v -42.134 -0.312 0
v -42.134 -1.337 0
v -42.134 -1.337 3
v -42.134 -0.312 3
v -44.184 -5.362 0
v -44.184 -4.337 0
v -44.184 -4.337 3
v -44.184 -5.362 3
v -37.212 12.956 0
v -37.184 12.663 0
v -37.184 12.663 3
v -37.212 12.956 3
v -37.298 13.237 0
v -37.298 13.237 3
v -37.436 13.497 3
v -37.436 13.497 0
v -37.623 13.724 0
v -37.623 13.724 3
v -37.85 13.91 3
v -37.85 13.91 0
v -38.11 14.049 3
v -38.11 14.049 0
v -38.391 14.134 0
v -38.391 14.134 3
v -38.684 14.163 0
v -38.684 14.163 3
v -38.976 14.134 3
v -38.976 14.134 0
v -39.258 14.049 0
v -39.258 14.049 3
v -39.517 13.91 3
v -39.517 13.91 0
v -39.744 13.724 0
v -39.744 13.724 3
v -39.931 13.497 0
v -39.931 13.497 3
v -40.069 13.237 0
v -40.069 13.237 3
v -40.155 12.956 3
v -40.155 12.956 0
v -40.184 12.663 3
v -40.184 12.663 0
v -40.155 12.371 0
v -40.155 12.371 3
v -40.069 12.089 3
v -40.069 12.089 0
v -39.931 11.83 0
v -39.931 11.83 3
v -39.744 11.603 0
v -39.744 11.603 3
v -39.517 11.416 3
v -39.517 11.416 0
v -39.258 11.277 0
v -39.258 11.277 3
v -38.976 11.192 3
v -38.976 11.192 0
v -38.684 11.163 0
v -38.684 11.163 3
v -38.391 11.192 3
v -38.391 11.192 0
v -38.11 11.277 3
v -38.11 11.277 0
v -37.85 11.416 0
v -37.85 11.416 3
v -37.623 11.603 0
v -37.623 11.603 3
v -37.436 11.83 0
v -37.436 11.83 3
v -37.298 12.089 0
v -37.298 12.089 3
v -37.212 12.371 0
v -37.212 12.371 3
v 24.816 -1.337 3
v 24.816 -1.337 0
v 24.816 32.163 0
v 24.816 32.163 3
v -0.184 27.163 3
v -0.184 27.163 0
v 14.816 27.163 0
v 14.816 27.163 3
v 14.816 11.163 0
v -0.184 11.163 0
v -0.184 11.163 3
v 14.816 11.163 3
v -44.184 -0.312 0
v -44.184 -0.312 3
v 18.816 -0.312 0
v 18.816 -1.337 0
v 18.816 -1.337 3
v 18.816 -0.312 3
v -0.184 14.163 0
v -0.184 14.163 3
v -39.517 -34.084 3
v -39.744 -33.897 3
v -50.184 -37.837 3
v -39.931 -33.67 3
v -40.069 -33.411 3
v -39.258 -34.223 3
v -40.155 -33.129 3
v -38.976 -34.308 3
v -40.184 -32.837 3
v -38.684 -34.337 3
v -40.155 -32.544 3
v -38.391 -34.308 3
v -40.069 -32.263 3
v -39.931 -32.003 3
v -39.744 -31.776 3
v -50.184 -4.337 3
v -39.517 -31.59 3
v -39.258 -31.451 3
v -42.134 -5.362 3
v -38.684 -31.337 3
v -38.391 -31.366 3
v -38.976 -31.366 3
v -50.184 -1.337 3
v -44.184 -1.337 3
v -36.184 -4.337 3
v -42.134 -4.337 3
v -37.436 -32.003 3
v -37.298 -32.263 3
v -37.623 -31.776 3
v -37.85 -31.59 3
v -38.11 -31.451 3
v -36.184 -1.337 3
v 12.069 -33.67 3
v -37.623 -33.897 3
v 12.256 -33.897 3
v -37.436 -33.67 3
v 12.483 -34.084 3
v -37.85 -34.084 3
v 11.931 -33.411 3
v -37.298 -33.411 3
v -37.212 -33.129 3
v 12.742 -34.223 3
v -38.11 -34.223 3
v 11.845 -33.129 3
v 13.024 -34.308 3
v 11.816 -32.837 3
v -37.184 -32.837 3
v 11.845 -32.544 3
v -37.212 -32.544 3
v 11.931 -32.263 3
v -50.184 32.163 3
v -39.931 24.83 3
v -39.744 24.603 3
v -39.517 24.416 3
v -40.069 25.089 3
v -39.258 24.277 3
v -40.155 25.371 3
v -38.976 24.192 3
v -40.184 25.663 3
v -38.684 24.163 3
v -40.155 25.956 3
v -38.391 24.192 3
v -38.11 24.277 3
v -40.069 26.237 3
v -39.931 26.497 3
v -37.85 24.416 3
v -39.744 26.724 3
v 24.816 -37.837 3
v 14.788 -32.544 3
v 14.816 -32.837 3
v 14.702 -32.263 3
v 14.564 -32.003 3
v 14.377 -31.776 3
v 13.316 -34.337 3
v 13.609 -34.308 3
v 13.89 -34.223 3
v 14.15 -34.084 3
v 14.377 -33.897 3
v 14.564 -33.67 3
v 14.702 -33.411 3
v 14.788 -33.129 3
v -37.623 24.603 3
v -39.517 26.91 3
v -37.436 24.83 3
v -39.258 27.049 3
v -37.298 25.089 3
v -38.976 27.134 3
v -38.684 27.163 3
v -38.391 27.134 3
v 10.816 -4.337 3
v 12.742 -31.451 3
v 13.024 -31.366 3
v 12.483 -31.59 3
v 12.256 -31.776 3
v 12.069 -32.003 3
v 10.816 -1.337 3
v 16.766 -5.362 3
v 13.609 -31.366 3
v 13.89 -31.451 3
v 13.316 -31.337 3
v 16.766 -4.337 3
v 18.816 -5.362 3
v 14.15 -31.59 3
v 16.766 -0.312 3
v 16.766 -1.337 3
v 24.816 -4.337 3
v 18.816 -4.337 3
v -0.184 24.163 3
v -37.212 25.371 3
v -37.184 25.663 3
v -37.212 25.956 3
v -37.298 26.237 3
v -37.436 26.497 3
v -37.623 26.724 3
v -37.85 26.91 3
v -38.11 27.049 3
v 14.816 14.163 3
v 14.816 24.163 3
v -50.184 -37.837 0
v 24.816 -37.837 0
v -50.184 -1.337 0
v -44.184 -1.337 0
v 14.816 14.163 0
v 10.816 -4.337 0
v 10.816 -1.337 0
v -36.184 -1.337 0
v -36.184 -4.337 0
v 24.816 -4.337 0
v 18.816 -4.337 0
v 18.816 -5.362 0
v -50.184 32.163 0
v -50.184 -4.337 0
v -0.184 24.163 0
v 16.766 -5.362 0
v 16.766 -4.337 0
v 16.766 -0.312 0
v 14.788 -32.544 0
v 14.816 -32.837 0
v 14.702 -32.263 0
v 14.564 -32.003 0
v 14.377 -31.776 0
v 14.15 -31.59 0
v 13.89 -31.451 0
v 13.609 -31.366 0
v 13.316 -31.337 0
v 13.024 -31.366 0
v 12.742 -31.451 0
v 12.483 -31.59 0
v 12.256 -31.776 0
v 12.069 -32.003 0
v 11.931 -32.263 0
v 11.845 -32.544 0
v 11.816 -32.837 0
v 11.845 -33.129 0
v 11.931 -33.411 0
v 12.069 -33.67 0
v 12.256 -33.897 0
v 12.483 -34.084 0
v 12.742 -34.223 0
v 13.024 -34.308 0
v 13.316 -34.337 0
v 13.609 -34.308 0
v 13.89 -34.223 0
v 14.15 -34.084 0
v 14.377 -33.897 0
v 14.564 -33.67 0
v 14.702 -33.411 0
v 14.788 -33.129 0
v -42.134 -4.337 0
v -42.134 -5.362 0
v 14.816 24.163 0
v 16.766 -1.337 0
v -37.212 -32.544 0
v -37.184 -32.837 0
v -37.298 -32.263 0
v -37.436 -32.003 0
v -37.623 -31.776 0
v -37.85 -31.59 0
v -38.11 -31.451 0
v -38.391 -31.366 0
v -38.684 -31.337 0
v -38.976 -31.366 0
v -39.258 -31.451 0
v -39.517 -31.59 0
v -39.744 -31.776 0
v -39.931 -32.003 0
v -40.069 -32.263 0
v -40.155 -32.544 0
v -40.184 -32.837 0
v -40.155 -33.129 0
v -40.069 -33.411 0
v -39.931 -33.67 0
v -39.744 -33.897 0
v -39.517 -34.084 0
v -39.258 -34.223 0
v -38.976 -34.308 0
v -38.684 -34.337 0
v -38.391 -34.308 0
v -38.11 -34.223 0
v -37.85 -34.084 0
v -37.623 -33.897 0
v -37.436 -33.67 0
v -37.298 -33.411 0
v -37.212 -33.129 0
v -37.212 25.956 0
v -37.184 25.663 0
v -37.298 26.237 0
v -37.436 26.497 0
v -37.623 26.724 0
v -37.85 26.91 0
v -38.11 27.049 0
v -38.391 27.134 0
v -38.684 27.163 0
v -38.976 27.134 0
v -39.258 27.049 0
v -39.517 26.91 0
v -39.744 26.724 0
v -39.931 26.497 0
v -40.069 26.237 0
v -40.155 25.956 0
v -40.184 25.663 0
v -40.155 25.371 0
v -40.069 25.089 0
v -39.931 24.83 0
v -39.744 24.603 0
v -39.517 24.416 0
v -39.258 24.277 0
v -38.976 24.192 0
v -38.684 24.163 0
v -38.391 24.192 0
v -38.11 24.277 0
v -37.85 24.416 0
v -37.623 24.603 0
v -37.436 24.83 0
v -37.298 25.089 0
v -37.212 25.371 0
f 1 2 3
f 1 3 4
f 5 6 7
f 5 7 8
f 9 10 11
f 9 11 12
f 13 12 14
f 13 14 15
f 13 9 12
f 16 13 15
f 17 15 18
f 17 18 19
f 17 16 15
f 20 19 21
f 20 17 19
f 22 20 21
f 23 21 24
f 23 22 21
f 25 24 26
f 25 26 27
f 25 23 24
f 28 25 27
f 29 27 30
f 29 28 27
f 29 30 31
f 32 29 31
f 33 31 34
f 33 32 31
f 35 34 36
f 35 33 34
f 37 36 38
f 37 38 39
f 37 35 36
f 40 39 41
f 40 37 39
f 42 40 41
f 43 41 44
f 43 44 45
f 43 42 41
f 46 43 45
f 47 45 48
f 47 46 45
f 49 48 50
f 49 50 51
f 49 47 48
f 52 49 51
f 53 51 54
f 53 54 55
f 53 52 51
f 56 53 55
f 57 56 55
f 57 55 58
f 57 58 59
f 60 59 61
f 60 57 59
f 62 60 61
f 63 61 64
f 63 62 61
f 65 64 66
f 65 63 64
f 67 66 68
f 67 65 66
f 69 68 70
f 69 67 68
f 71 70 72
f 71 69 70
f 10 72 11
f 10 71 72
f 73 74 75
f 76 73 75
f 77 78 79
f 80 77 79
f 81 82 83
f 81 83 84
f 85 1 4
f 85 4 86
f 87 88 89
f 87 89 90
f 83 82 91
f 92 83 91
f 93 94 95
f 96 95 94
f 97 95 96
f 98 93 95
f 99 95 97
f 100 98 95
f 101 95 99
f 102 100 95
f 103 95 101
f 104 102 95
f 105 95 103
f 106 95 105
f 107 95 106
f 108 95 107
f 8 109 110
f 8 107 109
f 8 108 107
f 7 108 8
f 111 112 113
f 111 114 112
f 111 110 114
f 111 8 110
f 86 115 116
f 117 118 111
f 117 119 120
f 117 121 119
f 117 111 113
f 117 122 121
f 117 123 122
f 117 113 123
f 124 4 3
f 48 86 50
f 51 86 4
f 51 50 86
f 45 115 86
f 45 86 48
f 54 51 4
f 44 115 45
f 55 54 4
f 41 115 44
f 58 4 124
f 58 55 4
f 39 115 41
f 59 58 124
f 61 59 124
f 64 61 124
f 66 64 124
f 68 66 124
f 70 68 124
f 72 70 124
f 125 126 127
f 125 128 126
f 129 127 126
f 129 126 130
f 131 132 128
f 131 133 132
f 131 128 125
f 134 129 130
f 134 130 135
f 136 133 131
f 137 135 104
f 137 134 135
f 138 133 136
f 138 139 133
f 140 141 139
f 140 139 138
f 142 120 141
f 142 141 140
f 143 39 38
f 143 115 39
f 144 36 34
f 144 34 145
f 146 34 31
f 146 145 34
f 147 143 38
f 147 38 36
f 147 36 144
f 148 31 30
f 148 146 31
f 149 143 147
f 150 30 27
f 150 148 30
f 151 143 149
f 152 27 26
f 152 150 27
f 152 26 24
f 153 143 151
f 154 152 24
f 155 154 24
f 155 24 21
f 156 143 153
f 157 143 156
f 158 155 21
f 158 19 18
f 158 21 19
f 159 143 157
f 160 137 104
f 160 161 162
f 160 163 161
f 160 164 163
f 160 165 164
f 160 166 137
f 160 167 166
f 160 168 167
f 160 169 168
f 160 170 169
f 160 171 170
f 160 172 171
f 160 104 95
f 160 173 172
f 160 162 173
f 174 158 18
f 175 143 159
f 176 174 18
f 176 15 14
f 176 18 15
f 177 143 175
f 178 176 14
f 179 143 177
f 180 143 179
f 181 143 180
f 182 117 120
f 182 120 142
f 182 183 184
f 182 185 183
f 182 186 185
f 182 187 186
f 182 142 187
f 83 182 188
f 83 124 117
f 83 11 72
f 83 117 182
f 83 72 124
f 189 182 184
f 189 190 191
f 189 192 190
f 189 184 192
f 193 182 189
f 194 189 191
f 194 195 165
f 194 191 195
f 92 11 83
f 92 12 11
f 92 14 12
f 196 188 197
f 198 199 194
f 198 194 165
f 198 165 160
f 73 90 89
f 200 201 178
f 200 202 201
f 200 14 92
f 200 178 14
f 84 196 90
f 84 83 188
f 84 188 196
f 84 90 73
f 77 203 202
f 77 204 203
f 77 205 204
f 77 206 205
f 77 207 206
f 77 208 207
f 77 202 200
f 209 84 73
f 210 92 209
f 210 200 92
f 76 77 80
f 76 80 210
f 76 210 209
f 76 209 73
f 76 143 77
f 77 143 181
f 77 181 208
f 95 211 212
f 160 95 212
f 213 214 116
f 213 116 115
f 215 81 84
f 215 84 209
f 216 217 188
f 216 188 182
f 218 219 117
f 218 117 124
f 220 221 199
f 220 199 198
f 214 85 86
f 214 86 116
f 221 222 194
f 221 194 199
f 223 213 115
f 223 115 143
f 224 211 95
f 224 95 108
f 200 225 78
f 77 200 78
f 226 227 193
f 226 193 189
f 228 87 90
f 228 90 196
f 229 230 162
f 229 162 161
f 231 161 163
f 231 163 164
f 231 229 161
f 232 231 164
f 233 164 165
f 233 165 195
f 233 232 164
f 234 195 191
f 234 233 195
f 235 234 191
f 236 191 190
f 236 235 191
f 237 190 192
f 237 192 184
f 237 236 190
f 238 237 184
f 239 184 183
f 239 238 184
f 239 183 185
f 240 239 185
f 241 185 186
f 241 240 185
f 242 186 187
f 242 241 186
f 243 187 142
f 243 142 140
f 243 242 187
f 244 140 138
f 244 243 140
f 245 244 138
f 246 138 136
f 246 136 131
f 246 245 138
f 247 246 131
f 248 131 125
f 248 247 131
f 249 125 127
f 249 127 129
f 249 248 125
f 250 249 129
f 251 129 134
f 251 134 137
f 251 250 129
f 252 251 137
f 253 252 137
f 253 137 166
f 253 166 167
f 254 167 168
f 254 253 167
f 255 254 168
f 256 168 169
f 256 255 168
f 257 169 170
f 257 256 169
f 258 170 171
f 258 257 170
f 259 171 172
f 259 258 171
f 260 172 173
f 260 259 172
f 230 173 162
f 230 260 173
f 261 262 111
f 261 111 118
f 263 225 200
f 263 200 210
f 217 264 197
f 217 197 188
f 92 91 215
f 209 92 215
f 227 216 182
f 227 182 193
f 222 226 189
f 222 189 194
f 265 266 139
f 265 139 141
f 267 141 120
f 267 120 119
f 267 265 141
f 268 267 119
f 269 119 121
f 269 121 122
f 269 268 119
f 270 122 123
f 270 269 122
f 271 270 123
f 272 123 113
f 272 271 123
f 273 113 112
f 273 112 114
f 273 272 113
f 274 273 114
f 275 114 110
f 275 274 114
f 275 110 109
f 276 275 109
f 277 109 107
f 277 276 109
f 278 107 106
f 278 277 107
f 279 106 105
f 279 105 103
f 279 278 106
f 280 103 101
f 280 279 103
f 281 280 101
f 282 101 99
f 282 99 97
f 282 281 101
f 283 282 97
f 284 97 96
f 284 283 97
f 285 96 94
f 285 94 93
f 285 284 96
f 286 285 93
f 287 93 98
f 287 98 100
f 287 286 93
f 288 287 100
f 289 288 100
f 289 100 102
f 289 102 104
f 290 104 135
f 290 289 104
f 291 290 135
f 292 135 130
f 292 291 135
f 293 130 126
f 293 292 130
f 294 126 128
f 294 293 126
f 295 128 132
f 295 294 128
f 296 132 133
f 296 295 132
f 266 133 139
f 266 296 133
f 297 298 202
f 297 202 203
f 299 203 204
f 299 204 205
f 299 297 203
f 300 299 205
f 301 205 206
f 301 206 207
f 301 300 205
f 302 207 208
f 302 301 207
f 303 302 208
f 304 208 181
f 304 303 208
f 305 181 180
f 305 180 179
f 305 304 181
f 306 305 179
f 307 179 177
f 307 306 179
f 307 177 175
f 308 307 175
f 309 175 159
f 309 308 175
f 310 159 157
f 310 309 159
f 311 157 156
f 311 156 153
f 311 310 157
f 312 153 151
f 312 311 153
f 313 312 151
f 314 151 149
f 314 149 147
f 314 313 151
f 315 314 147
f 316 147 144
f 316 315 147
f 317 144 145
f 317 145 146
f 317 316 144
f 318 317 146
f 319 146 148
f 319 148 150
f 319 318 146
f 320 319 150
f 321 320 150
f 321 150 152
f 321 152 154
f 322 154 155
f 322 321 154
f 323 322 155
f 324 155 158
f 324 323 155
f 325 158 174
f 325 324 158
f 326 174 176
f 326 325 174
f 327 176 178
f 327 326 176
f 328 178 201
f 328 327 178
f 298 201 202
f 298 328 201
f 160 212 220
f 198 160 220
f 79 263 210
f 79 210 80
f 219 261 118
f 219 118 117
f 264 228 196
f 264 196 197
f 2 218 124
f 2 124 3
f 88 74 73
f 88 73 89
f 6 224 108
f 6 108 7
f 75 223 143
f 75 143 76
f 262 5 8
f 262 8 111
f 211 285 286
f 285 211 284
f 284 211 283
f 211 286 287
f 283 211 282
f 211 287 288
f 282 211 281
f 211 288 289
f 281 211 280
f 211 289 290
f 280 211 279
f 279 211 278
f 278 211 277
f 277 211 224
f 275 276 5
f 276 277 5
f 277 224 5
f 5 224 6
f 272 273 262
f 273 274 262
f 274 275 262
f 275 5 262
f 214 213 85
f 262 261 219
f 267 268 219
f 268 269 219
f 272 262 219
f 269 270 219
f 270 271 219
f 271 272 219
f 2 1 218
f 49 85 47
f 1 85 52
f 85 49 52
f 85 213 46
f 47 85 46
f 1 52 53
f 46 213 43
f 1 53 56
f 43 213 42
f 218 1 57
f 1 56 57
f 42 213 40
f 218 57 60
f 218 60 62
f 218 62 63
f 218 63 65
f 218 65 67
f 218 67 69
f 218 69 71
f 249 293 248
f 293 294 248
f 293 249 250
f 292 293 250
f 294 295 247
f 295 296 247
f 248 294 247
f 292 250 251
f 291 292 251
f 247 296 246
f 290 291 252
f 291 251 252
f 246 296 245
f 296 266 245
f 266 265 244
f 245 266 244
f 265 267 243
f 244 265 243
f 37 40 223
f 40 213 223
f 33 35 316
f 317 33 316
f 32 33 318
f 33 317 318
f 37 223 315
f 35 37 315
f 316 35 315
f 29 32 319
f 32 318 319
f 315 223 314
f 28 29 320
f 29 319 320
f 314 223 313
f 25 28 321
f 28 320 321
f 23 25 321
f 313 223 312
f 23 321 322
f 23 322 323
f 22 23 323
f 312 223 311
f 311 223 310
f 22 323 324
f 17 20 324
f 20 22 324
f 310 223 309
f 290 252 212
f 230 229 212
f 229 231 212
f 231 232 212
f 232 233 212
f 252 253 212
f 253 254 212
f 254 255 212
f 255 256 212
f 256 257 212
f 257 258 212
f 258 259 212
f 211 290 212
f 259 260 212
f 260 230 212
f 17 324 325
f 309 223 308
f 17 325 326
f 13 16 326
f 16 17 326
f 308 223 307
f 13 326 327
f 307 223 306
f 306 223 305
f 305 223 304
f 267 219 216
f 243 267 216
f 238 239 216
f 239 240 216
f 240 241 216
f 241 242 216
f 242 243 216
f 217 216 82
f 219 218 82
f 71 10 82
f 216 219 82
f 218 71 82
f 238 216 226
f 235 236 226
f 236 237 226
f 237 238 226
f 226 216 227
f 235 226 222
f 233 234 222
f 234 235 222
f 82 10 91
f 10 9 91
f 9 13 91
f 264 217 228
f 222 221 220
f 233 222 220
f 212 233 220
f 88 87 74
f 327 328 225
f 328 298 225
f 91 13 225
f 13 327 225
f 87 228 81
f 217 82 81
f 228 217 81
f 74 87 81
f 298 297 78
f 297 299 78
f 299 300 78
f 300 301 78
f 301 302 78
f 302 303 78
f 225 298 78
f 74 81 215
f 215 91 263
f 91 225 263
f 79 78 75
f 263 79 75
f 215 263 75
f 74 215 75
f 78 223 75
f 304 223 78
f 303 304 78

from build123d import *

# Parameters (mm, degrees)
ESQUISSE1_W                  = 75
ESQUISSE1_H                  = 70
ESQUISSE1_R                  = 1.5
ESQUISSE1_W_2                = 15
ESQUISSE1_H_2                = 3
BOSS_EXTRU_1_DEPTH           = 3
ENL_V_MAT_EXTRU_1_DEPTH      = 10
ENL_V_MAT_EXTRU_1_DEPTH_BACK = 10


with BuildPart() as part:
    # Esquisse1 → Boss.-Extru.1 (new body)
    with BuildSketch(Plane.XY):
        with Locations((-12.683673469, -2.836734694)):
            Rectangle(ESQUISSE1_W, ESQUISSE1_H)
        with Locations((-38.683673469, 25.663265306)):
            Circle(ESQUISSE1_R, mode=Mode.SUBTRACT)
        with Locations((-38.683673469, 12.663265306)):
            Circle(ESQUISSE1_R, mode=Mode.SUBTRACT)
        with Locations((-38.683673469, -32.836734694)):
            Circle(ESQUISSE1_R, mode=Mode.SUBTRACT)
        with Locations((13.316326531, -32.836734694)):
            Circle(ESQUISSE1_R, mode=Mode.SUBTRACT)
        with Locations((7.316326531, 12.663265306)):
            Rectangle(ESQUISSE1_W_2, ESQUISSE1_H_2, mode=Mode.SUBTRACT)
        with Locations((7.316326531, 25.663265306)):
            Rectangle(ESQUISSE1_W_2, ESQUISSE1_H_2, mode=Mode.SUBTRACT)
    extrude(amount=BOSS_EXTRU_1_DEPTH)

    # Esquisse2 → Enlèv. mat.-Extru.1 (cut, two sides: drawn at the far end of the back side and taken through both)
    with BuildSketch(Plane.XY.offset(-ENL_V_MAT_EXTRU_1_DEPTH_BACK)):
        Polygon((24.816326531, -1.336734694), (18.816326531, -1.336734694), (18.816326531, -0.311734694), (16.766326531, -0.311734694), (16.766326531, -1.336734694), (10.816326531, -1.336734694), (10.816326531, -4.336734694), (16.766326531, -4.336734694), (16.766326531, -5.361734694), (18.816326531, -5.361734694), (18.816326531, -4.336734694), (24.816326531, -4.336734694), align=None)
        Polygon((-50.183673469, -1.336734694), (-50.183673469, -4.336734694), (-44.183673469, -4.336734694), (-44.183673469, -5.361734694), (-42.133673469, -5.361734694), (-42.133673469, -4.336734694), (-36.183673469, -4.336734694), (-36.183673469, -1.336734694), (-42.133673469, -1.336734694), (-42.133673469, -0.311734694), (-44.183673469, -0.311734694), (-44.183673469, -1.336734694), align=None)
    extrude(amount=ENL_V_MAT_EXTRU_1_DEPTH + ENL_V_MAT_EXTRU_1_DEPTH_BACK, mode=Mode.SUBTRACT)


solid = part.part
